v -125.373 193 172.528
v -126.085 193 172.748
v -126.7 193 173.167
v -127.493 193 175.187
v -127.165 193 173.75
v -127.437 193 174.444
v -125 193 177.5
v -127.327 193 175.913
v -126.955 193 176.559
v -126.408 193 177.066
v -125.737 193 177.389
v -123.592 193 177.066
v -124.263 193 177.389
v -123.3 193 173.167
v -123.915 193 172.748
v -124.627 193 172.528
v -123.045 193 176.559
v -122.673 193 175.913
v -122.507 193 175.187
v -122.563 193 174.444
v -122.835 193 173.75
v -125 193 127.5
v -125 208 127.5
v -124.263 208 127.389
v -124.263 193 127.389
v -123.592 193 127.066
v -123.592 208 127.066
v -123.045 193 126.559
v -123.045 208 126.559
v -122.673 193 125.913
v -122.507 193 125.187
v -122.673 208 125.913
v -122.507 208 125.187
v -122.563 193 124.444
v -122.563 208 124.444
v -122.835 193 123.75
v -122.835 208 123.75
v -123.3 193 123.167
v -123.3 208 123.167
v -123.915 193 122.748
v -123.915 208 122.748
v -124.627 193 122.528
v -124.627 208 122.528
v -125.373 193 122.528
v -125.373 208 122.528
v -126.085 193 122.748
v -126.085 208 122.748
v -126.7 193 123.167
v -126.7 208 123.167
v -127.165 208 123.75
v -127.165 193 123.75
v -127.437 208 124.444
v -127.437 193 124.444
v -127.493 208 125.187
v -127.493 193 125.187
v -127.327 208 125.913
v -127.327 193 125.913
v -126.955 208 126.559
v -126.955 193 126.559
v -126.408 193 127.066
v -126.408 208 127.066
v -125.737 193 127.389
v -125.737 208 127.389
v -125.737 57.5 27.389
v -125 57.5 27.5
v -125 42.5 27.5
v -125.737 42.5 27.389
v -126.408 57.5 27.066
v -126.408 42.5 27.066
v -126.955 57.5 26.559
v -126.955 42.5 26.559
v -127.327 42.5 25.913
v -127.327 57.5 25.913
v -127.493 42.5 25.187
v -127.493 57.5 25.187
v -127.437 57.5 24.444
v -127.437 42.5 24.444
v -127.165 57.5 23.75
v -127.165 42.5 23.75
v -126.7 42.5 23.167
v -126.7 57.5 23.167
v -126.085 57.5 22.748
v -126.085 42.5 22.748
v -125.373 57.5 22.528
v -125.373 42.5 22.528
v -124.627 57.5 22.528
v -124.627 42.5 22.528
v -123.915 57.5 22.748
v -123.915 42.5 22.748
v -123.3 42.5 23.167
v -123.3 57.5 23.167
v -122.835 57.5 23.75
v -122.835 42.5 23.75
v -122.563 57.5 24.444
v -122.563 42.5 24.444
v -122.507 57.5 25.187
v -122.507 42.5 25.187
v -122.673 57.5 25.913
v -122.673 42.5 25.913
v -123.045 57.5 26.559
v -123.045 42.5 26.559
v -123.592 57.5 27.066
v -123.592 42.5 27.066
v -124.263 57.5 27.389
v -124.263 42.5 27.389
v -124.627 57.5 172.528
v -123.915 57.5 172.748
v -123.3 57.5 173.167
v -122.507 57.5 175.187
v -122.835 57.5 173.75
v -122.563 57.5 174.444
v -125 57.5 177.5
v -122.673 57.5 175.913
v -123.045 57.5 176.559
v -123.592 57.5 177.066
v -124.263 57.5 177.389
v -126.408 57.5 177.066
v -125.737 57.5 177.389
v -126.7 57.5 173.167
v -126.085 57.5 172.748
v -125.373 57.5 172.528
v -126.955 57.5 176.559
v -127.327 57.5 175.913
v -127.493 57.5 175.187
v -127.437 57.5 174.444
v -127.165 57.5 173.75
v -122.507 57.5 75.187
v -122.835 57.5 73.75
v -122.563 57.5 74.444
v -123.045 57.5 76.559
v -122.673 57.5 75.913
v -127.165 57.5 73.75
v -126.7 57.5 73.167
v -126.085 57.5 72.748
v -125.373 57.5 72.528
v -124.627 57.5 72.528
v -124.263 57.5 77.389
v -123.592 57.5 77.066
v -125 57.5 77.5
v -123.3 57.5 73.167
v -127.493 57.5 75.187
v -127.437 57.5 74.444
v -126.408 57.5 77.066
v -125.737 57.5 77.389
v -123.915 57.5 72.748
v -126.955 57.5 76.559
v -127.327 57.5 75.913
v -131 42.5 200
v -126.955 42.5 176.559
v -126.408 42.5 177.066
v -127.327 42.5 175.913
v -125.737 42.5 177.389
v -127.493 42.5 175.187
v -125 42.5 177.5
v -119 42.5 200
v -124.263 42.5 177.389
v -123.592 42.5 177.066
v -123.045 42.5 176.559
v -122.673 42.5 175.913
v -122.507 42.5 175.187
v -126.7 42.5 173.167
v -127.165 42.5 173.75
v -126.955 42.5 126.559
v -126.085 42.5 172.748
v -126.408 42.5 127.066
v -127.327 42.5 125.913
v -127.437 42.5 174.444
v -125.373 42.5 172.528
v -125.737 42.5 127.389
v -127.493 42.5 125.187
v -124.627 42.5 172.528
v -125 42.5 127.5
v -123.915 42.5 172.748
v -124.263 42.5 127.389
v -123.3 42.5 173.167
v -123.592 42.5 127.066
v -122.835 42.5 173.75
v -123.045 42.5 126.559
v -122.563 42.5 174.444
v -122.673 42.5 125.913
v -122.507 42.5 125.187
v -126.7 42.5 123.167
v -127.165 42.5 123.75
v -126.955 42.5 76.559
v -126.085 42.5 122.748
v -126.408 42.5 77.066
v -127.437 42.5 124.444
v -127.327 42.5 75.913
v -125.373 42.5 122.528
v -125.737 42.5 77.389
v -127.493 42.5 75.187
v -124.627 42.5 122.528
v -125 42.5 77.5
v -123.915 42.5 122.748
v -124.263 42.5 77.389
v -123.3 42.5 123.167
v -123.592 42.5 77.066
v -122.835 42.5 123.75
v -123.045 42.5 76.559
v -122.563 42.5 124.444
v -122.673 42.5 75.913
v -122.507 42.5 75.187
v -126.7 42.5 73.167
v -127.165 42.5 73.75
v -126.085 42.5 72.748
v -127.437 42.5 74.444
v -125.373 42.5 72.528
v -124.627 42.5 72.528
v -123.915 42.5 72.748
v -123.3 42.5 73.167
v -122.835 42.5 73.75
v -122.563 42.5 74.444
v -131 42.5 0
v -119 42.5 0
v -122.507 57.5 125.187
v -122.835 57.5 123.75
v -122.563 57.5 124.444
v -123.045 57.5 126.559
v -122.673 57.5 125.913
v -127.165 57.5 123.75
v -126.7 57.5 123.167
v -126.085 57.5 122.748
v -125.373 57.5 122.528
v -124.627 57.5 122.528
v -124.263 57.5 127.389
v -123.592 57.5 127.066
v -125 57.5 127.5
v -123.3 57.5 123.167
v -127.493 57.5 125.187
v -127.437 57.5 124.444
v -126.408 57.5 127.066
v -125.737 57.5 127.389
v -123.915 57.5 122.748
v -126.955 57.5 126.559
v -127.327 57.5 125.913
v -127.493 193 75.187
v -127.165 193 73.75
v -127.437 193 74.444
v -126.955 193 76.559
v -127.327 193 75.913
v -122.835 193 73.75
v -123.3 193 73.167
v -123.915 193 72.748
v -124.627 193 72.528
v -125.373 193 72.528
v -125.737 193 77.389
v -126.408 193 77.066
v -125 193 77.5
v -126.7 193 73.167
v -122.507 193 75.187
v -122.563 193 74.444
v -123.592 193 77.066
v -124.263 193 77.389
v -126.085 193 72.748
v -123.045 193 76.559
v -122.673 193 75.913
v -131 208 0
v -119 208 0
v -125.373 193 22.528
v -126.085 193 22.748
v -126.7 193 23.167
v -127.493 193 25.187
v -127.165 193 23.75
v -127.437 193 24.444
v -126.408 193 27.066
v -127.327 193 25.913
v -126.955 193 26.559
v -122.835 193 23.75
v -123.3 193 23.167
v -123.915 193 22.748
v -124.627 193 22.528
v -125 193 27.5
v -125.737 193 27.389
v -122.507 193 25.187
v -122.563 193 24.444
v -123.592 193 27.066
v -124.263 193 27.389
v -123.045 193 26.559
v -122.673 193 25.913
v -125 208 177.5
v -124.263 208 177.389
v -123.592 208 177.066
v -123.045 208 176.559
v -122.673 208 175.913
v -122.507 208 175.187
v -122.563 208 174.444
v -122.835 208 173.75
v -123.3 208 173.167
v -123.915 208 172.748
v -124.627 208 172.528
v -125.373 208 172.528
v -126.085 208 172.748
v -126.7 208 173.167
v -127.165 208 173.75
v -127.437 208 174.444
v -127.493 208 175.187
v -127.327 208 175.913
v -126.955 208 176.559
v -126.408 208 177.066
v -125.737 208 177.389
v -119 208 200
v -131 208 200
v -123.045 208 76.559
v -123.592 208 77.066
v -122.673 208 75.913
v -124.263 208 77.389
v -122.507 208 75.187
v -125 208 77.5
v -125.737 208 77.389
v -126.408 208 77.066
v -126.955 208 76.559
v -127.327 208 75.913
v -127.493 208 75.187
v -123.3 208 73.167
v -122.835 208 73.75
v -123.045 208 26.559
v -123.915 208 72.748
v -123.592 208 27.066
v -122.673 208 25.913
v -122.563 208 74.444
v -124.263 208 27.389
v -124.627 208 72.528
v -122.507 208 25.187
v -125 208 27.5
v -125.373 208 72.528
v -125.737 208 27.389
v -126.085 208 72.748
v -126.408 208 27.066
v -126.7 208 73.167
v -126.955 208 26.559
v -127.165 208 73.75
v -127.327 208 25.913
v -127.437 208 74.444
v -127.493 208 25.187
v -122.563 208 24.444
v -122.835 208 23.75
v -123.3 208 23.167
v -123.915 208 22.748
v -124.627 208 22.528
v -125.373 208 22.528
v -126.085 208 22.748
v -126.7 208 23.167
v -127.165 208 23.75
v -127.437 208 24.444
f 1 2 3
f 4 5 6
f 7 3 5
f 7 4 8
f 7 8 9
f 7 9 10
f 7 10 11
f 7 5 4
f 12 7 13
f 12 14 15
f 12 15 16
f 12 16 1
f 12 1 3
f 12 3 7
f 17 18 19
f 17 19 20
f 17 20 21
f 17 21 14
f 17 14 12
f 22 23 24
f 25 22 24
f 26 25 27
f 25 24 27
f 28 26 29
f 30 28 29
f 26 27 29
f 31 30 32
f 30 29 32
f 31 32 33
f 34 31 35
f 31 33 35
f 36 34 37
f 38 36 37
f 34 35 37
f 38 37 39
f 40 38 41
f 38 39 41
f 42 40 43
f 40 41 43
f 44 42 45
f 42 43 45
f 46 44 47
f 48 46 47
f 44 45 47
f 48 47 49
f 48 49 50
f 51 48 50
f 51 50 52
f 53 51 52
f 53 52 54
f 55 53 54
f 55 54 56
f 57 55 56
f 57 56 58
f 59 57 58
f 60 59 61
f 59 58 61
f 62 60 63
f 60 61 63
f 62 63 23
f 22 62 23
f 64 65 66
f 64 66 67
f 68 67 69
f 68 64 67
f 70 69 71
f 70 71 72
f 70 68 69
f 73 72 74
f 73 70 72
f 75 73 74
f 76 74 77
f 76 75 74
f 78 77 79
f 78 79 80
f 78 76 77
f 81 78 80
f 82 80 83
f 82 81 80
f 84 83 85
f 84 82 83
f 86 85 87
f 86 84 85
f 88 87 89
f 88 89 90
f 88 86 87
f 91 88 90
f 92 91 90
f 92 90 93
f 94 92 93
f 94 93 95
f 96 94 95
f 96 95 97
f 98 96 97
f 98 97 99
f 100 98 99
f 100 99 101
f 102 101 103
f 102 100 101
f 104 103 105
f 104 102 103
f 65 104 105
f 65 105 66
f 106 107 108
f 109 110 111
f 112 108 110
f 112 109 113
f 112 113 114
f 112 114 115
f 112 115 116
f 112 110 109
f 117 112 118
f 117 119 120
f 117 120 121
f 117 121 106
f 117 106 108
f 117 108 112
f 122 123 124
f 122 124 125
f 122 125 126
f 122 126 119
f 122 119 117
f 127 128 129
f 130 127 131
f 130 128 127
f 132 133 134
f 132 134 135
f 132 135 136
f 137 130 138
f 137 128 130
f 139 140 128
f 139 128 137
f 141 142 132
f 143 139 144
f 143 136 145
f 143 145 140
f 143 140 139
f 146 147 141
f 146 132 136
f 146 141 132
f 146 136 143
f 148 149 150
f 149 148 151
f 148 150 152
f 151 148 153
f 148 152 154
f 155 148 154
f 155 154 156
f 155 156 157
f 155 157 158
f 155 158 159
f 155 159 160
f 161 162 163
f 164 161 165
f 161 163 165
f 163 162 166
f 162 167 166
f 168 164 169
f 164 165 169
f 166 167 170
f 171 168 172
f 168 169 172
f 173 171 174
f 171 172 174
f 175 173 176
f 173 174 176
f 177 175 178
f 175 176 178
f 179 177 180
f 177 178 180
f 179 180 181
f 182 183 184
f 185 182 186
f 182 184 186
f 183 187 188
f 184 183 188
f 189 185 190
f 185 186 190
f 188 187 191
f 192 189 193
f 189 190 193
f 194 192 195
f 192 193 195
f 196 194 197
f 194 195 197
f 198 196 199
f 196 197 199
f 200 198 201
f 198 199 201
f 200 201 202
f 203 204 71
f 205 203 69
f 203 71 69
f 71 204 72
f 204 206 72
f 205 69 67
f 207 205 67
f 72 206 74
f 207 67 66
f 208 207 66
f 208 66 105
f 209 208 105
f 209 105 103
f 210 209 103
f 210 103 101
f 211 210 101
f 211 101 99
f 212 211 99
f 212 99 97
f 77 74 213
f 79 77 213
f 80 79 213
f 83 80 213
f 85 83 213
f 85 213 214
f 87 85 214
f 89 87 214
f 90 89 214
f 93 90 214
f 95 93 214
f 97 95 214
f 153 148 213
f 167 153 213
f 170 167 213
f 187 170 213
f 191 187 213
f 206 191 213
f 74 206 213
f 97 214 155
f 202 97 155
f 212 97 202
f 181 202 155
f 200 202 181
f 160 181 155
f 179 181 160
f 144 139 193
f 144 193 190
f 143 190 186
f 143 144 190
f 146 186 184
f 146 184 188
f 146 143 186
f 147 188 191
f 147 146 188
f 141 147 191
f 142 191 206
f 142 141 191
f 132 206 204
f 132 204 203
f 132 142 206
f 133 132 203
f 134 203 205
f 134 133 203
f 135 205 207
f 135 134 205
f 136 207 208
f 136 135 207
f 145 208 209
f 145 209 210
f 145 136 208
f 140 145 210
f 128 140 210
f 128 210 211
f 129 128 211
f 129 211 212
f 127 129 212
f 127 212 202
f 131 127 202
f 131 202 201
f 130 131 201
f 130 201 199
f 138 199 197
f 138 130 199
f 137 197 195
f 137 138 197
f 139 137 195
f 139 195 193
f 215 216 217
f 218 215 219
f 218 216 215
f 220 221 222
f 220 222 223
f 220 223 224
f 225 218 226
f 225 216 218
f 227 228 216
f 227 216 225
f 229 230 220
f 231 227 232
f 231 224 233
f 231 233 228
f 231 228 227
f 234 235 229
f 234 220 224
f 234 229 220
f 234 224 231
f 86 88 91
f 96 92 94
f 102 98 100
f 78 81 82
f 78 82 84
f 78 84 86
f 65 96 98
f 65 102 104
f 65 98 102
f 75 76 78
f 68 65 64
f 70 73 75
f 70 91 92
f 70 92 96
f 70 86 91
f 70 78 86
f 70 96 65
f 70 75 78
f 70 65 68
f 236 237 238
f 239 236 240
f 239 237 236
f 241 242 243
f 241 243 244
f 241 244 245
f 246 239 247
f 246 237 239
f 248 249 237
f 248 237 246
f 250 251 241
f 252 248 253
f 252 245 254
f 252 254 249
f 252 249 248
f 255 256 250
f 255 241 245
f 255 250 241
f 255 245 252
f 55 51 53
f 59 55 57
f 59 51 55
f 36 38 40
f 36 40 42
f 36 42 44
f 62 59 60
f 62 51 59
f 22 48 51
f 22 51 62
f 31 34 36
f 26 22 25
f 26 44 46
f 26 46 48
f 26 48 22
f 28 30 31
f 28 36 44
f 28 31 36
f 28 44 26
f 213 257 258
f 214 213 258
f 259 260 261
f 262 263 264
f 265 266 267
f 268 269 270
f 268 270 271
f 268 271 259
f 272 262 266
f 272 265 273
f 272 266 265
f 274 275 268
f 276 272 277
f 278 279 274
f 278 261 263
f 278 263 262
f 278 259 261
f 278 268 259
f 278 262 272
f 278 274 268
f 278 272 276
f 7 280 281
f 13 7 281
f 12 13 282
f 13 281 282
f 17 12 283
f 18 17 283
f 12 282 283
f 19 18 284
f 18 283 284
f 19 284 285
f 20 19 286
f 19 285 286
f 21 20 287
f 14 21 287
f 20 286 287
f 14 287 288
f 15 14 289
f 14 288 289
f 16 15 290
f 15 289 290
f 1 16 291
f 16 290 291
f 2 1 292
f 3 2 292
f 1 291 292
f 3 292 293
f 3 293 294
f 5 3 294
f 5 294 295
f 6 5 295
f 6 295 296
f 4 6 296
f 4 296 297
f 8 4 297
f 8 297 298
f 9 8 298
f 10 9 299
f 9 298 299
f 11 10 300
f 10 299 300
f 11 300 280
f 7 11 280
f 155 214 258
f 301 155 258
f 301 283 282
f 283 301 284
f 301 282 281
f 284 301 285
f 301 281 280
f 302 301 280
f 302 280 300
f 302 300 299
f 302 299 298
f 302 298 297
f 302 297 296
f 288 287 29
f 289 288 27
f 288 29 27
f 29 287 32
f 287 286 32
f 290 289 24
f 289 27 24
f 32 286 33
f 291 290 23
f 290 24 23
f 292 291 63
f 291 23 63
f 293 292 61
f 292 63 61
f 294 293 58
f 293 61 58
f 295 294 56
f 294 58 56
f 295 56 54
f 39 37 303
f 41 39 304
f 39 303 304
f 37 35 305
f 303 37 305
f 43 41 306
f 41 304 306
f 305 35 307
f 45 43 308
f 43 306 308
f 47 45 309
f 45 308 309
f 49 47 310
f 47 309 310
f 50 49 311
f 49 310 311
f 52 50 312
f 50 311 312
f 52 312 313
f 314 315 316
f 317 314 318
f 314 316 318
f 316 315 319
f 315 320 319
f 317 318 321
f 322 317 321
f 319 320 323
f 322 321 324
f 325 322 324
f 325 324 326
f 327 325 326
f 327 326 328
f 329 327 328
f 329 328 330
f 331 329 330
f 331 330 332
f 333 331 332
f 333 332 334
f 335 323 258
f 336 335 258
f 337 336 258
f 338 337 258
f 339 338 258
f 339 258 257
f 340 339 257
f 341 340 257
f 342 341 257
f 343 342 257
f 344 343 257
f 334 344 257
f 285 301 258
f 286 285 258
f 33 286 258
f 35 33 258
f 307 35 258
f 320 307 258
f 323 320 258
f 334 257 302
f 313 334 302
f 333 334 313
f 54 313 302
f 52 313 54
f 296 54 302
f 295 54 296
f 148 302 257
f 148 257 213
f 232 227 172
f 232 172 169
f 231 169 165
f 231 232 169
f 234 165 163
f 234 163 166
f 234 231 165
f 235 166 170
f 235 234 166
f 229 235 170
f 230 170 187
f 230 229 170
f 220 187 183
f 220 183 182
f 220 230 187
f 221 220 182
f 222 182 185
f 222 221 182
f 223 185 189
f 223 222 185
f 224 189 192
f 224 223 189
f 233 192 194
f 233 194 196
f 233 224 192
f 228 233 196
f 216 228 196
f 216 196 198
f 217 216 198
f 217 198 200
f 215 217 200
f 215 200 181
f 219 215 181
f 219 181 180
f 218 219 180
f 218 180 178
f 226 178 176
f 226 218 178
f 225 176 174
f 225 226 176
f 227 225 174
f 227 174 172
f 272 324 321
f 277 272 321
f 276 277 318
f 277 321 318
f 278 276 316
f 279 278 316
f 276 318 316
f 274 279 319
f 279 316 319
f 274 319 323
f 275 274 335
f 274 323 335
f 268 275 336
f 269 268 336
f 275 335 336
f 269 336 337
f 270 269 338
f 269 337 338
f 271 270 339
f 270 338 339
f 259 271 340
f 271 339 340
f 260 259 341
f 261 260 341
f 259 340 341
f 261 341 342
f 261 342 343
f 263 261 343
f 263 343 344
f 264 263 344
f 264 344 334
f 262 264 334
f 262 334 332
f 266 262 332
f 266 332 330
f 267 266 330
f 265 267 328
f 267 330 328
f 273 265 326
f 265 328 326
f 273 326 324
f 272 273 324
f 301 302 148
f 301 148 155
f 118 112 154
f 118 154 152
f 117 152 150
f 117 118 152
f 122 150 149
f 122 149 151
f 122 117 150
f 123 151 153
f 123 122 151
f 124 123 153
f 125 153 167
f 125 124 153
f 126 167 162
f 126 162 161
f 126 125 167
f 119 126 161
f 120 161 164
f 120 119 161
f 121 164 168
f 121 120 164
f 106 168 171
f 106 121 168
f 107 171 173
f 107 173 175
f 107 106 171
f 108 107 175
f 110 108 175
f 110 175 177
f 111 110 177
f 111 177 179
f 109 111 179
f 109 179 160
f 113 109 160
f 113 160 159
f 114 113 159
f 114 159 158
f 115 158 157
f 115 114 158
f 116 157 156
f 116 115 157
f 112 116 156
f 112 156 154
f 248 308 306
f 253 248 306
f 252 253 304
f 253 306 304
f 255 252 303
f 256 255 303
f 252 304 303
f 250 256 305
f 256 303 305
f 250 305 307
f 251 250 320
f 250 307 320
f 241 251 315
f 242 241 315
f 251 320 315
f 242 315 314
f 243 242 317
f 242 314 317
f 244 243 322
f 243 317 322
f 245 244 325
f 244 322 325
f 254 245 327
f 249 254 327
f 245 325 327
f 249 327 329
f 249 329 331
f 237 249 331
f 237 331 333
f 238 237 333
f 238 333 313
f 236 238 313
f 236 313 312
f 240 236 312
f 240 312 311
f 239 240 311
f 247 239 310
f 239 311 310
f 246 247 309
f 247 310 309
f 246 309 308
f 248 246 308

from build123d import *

# Parameters (mm, degrees)
BOSS_EXTRUDE1_DEPTH = 200
SKETCH2_R           = 2.5
CUT_EXTRUDE2_DEPTH  = 15
CUT_EXTRUDE3_START  = -15
SKETCH3_R           = 2.5
CUT_EXTRUDE3_DEPTH  = 15


with BuildPart() as part:
    # Sketch1 → Boss-Extrude1 (new body)
    with BuildSketch(Plane.XY):
        Polygon((-119, 208), (-131, 208), (-131, 42.5), (-119, 42.5), (-119, 165), align=None)
    extrude(amount=BOSS_EXTRUDE1_DEPTH)

    # Sketch2 → Cut-Extrude2 (cut)
    with BuildSketch(Plane(origin=(0, 208, 0), x_dir=(1, 0, 0), z_dir=(0, 1, 0))):
        with Locations(Location((-125, -25, 0), (0, 0, 270))):
            Circle(SKETCH2_R)
        with Locations(Location((-125, -75, 0), (0, 0, 270))):
            Circle(SKETCH2_R)
        with Locations(Location((-125, -125, 0), (0, 0, 270))):
            Circle(SKETCH2_R)
        with Locations(Location((-125, -175, 0), (0, 0, 270))):
            Circle(SKETCH2_R)
    extrude(amount=-CUT_EXTRUDE2_DEPTH, mode=Mode.SUBTRACT)

    # Sketch3 → Cut-Extrude3 (cut)
    with BuildSketch(Plane.XZ.offset(-42.5).offset(CUT_EXTRUDE3_START)):
        with Locations(Location((-125, 175, 0), (0, 0, 90))):
            Circle(SKETCH3_R)
        with Locations(Location((-125, 125, 0), (0, 0, 90))):
            Circle(SKETCH3_R)
        with Locations(Location((-125, 75, 0), (0, 0, 90))):
            Circle(SKETCH3_R)
        with Locations(Location((-125, 25, 0), (0, 0, 90))):
            Circle(SKETCH3_R)
    extrude(amount=CUT_EXTRUDE3_DEPTH, mode=Mode.SUBTRACT)


solid = part.part
